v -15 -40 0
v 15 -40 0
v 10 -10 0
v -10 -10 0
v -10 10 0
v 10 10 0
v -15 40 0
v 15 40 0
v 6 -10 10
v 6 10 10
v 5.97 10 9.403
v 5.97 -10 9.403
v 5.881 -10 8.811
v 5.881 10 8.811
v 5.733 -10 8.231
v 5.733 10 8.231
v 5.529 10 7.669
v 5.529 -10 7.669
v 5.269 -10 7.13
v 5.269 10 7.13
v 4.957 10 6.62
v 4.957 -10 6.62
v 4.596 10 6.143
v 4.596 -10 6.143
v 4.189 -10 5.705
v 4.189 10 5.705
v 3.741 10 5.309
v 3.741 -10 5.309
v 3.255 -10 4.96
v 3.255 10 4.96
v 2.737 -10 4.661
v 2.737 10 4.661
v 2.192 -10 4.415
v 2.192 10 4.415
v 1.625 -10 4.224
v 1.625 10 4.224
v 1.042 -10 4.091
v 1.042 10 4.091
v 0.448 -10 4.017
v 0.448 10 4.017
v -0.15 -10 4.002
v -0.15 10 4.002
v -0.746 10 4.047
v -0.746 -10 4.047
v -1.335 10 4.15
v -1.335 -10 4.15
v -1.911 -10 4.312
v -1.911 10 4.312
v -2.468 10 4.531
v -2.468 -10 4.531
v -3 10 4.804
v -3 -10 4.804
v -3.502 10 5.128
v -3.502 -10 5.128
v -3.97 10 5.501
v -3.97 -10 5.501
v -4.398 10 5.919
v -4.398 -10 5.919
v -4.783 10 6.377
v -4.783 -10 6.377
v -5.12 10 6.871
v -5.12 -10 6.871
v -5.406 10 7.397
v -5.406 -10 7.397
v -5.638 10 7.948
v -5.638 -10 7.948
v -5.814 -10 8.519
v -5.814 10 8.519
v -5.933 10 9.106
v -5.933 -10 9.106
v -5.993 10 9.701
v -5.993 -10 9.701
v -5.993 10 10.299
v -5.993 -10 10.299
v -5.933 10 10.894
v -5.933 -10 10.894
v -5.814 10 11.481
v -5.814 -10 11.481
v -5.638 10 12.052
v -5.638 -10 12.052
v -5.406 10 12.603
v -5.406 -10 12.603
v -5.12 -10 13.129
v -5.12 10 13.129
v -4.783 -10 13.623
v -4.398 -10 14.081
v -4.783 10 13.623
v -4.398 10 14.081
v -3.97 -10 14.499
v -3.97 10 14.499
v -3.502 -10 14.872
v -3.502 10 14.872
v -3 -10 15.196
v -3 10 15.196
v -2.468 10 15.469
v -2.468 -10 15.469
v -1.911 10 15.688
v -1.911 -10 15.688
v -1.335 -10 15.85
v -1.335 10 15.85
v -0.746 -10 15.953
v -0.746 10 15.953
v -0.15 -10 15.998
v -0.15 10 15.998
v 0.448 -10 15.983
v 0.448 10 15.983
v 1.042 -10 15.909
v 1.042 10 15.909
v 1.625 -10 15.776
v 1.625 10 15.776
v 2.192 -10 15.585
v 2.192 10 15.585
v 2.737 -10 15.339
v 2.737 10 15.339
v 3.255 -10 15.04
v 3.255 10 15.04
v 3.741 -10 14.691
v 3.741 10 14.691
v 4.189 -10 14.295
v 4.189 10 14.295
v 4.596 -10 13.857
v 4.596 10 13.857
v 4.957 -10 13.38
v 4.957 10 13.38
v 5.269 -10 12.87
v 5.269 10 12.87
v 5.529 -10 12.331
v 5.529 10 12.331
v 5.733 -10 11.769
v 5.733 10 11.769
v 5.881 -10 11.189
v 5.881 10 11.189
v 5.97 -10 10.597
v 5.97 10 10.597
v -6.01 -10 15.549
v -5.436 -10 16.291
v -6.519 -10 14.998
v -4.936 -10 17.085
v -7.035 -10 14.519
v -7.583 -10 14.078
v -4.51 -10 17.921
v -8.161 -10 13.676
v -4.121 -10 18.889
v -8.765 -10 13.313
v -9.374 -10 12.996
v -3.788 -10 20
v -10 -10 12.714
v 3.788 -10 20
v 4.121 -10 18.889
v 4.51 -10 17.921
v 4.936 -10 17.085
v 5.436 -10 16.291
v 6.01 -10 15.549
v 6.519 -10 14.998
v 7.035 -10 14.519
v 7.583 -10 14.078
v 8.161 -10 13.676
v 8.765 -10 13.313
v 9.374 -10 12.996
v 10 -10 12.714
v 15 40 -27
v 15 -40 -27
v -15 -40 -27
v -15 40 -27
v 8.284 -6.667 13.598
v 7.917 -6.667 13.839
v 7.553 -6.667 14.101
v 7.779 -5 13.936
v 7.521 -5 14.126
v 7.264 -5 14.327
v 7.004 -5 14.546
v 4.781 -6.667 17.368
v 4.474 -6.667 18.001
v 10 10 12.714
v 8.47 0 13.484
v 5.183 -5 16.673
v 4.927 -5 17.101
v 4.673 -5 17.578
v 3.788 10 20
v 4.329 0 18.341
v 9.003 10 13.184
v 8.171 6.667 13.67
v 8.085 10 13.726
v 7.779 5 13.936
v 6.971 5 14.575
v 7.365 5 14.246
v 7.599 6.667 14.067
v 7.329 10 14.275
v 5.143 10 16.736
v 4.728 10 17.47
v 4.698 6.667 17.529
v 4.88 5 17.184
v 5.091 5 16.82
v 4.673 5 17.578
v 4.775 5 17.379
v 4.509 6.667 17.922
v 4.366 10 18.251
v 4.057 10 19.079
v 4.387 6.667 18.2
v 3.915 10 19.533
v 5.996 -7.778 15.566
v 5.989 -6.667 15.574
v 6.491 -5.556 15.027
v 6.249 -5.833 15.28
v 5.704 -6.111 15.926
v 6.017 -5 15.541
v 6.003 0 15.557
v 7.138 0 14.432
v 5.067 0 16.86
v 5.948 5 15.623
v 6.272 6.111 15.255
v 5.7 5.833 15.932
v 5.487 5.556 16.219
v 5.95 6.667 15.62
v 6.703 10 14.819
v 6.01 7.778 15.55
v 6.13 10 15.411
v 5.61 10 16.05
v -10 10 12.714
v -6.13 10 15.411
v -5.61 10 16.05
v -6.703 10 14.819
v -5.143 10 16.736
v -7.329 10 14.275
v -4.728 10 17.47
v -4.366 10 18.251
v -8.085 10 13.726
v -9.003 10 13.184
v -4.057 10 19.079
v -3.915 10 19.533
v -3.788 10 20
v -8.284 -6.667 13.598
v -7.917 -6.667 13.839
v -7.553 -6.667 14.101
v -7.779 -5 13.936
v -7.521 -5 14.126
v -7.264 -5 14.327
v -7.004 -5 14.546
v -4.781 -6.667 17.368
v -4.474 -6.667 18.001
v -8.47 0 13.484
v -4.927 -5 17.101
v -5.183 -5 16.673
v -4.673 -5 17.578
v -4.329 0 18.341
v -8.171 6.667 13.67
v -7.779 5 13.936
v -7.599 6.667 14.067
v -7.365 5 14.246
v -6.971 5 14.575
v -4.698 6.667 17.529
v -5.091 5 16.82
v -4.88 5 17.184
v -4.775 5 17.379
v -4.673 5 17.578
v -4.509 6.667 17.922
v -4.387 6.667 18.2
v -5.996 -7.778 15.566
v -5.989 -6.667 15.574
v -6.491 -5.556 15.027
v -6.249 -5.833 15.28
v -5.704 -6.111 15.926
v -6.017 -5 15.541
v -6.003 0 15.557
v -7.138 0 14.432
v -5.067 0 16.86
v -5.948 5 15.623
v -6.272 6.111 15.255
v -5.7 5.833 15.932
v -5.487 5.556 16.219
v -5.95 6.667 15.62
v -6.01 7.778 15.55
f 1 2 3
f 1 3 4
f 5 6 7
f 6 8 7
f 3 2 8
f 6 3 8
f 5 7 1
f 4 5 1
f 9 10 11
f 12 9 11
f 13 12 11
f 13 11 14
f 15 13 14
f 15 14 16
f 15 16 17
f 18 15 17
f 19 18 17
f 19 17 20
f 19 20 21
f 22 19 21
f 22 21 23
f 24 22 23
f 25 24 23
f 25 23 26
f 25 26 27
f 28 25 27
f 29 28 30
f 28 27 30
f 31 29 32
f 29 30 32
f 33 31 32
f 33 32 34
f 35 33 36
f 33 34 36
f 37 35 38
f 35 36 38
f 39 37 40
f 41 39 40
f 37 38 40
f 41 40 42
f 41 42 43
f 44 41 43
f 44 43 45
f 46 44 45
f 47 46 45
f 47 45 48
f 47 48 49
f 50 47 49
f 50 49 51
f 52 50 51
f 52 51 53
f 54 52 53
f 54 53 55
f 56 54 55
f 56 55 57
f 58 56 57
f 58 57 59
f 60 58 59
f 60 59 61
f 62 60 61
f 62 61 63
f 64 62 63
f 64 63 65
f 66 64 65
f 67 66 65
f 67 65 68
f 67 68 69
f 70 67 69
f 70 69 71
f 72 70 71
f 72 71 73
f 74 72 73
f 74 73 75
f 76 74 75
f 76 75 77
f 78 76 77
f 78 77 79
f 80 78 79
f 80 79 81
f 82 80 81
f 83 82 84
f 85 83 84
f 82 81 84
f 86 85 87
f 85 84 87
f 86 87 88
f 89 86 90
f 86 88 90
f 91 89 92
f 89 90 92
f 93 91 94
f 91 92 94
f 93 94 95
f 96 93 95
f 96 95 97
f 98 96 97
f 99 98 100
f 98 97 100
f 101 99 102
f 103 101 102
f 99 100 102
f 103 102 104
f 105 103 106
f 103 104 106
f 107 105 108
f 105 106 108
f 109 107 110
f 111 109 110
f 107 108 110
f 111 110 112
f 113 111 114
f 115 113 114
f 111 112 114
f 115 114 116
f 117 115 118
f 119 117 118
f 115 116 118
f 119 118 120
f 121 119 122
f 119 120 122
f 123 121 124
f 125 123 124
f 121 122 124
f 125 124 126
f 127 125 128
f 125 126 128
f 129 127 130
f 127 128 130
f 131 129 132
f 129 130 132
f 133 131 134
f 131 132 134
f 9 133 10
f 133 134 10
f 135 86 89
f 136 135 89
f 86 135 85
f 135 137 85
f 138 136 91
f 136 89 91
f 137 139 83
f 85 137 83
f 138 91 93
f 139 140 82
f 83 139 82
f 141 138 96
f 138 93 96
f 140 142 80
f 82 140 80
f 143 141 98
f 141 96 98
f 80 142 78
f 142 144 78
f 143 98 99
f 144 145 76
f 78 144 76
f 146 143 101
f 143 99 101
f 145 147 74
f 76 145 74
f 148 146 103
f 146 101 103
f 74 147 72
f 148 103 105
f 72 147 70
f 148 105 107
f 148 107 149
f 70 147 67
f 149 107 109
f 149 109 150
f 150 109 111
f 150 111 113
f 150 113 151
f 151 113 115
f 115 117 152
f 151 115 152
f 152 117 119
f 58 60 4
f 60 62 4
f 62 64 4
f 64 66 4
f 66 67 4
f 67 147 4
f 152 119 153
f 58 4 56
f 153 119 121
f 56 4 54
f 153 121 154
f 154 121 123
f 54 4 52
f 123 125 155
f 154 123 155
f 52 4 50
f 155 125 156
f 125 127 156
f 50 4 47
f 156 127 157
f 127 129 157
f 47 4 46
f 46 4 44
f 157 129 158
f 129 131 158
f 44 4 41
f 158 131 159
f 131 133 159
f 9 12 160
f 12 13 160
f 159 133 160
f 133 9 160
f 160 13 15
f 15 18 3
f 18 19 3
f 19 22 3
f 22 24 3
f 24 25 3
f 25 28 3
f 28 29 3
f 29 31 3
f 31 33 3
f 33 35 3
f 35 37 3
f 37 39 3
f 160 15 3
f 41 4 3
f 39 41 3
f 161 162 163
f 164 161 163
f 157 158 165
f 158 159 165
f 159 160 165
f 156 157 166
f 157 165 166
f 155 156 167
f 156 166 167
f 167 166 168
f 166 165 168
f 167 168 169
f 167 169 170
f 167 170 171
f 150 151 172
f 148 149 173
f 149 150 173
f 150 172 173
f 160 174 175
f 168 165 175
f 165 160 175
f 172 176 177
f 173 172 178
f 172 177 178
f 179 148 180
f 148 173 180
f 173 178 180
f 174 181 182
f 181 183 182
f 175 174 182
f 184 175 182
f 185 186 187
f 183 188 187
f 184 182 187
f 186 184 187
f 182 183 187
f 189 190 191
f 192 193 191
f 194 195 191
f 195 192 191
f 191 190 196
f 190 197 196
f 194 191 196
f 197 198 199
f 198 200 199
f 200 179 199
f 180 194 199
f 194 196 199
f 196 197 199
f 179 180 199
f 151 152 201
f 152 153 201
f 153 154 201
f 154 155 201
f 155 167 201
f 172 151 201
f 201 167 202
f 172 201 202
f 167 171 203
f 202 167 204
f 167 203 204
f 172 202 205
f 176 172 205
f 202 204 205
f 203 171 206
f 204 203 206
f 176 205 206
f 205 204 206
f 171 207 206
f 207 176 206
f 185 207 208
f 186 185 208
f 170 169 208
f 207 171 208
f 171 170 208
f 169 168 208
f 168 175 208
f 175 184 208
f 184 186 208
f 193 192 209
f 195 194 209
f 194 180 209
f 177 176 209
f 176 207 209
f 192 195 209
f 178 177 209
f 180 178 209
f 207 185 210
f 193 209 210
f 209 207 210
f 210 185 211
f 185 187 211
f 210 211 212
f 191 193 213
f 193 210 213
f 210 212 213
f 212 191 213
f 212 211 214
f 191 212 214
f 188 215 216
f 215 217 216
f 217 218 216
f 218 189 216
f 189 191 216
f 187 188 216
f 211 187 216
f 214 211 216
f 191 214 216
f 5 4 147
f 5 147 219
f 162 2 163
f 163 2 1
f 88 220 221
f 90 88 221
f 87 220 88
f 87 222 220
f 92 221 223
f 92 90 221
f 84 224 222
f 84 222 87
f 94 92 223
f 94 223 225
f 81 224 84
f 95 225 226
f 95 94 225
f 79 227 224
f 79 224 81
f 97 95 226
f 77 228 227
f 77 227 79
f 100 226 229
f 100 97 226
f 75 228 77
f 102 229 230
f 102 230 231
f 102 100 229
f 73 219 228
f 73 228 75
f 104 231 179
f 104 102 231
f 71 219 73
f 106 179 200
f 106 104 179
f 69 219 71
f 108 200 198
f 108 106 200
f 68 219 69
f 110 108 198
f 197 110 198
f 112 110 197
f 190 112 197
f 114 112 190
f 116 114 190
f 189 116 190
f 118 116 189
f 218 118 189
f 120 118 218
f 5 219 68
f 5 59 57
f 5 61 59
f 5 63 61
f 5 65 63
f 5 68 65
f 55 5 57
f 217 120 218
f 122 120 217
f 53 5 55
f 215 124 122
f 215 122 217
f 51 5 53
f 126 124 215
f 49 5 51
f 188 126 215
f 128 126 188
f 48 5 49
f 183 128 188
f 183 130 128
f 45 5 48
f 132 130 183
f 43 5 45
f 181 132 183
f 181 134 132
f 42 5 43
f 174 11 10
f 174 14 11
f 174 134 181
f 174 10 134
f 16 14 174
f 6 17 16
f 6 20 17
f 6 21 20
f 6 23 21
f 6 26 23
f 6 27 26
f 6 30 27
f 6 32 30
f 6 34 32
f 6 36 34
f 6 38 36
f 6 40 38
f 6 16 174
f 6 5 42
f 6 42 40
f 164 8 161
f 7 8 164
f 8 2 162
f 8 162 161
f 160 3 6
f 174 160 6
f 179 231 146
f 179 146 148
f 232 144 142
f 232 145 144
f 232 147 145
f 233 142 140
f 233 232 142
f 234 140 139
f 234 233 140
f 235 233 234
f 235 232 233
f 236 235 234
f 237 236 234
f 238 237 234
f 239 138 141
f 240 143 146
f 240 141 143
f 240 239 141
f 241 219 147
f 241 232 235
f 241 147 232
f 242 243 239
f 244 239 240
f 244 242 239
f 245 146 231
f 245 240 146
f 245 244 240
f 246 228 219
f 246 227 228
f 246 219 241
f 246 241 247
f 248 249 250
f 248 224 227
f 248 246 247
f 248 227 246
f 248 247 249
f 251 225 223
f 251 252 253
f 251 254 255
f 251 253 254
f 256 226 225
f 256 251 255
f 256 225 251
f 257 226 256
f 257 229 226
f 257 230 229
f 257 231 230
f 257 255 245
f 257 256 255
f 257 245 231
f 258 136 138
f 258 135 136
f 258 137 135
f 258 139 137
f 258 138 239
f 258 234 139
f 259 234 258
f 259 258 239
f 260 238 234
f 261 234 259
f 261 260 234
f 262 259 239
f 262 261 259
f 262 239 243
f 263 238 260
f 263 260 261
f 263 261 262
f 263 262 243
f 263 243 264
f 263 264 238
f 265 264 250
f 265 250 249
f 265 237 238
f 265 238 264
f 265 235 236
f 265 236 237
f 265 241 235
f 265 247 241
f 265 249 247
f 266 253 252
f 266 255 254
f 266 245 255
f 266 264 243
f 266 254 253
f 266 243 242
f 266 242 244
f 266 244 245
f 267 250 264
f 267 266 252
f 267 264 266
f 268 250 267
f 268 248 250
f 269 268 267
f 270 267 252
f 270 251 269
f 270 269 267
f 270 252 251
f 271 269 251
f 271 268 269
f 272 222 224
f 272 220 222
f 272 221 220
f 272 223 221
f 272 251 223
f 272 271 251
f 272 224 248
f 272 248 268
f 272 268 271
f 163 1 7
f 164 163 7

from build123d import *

# Parameters (mm, degrees)
SKETCH1_W           = 20
SKETCH1_H           = 20
BOSS_EXTRUDE1_DEPTH = 20
SKETCH2_R           = 6
CUT_EXTRUDE1_DEPTH  = 21
CUT_EXTRUDE2_DEPTH  = 21
SKETCH4_W           = 30
SKETCH4_H           = 80
BOSS_EXTRUDE2_DEPTH = 27


with BuildPart() as part:
    # Sketch1 → Boss-Extrude1 (new body)
    with BuildSketch(Plane.XY):
        Rectangle(SKETCH1_W, SKETCH1_H)
    extrude(amount=BOSS_EXTRUDE1_DEPTH)

    # Sketch2 → Cut-Extrude1 (cut, through all)
    with BuildSketch(Plane(origin=(0, 10, 0), x_dir=(1, 0, 0), z_dir=(0, 1, 0))):
        with Locations((0, -10)):
            Circle(SKETCH2_R)
    extrude(amount=-CUT_EXTRUDE1_DEPTH, mode=Mode.SUBTRACT)

    # Sketch3 → Cut-Extrude2 (cut, through all)
    with BuildSketch(Plane(origin=(0, 10, 0), x_dir=(1, 0, 0), z_dir=(0, 1, 0))):
        with BuildLine():
            Line((-10, -12.714318114), (-10, -20))
            Line((-10, -20), (-3.788282588, -20))
            add(Edge.make_bspline(
                [(-10, -12.714318114), (-5.112714727, -14.756625636), (-3.788282588, -20)],
                knots=[0, 0, 0, 1, 1, 1], degree=2))
        make_face()
        with BuildLine():
            Line((10, -12.714318114), (10, -20))
            Line((10, -20), (3.788282588, -20))
            add(Edge.make_bspline(
                [(10, -12.714318114), (5.112714727, -14.756625636), (3.788282588, -20)],
                knots=[0, 0, 0, 1, 1, 1], degree=2))
        make_face()
    extrude(amount=-CUT_EXTRUDE2_DEPTH, mode=Mode.SUBTRACT)

    # Sketch4 → Boss-Extrude2 (add)
    with BuildSketch(Plane(origin=(0, 0, 0), x_dir=(-1, 0, 0), z_dir=(0, 0, -1))):
        Rectangle(SKETCH4_W, SKETCH4_H)
    extrude(amount=BOSS_EXTRUDE2_DEPTH)


solid = part.part
